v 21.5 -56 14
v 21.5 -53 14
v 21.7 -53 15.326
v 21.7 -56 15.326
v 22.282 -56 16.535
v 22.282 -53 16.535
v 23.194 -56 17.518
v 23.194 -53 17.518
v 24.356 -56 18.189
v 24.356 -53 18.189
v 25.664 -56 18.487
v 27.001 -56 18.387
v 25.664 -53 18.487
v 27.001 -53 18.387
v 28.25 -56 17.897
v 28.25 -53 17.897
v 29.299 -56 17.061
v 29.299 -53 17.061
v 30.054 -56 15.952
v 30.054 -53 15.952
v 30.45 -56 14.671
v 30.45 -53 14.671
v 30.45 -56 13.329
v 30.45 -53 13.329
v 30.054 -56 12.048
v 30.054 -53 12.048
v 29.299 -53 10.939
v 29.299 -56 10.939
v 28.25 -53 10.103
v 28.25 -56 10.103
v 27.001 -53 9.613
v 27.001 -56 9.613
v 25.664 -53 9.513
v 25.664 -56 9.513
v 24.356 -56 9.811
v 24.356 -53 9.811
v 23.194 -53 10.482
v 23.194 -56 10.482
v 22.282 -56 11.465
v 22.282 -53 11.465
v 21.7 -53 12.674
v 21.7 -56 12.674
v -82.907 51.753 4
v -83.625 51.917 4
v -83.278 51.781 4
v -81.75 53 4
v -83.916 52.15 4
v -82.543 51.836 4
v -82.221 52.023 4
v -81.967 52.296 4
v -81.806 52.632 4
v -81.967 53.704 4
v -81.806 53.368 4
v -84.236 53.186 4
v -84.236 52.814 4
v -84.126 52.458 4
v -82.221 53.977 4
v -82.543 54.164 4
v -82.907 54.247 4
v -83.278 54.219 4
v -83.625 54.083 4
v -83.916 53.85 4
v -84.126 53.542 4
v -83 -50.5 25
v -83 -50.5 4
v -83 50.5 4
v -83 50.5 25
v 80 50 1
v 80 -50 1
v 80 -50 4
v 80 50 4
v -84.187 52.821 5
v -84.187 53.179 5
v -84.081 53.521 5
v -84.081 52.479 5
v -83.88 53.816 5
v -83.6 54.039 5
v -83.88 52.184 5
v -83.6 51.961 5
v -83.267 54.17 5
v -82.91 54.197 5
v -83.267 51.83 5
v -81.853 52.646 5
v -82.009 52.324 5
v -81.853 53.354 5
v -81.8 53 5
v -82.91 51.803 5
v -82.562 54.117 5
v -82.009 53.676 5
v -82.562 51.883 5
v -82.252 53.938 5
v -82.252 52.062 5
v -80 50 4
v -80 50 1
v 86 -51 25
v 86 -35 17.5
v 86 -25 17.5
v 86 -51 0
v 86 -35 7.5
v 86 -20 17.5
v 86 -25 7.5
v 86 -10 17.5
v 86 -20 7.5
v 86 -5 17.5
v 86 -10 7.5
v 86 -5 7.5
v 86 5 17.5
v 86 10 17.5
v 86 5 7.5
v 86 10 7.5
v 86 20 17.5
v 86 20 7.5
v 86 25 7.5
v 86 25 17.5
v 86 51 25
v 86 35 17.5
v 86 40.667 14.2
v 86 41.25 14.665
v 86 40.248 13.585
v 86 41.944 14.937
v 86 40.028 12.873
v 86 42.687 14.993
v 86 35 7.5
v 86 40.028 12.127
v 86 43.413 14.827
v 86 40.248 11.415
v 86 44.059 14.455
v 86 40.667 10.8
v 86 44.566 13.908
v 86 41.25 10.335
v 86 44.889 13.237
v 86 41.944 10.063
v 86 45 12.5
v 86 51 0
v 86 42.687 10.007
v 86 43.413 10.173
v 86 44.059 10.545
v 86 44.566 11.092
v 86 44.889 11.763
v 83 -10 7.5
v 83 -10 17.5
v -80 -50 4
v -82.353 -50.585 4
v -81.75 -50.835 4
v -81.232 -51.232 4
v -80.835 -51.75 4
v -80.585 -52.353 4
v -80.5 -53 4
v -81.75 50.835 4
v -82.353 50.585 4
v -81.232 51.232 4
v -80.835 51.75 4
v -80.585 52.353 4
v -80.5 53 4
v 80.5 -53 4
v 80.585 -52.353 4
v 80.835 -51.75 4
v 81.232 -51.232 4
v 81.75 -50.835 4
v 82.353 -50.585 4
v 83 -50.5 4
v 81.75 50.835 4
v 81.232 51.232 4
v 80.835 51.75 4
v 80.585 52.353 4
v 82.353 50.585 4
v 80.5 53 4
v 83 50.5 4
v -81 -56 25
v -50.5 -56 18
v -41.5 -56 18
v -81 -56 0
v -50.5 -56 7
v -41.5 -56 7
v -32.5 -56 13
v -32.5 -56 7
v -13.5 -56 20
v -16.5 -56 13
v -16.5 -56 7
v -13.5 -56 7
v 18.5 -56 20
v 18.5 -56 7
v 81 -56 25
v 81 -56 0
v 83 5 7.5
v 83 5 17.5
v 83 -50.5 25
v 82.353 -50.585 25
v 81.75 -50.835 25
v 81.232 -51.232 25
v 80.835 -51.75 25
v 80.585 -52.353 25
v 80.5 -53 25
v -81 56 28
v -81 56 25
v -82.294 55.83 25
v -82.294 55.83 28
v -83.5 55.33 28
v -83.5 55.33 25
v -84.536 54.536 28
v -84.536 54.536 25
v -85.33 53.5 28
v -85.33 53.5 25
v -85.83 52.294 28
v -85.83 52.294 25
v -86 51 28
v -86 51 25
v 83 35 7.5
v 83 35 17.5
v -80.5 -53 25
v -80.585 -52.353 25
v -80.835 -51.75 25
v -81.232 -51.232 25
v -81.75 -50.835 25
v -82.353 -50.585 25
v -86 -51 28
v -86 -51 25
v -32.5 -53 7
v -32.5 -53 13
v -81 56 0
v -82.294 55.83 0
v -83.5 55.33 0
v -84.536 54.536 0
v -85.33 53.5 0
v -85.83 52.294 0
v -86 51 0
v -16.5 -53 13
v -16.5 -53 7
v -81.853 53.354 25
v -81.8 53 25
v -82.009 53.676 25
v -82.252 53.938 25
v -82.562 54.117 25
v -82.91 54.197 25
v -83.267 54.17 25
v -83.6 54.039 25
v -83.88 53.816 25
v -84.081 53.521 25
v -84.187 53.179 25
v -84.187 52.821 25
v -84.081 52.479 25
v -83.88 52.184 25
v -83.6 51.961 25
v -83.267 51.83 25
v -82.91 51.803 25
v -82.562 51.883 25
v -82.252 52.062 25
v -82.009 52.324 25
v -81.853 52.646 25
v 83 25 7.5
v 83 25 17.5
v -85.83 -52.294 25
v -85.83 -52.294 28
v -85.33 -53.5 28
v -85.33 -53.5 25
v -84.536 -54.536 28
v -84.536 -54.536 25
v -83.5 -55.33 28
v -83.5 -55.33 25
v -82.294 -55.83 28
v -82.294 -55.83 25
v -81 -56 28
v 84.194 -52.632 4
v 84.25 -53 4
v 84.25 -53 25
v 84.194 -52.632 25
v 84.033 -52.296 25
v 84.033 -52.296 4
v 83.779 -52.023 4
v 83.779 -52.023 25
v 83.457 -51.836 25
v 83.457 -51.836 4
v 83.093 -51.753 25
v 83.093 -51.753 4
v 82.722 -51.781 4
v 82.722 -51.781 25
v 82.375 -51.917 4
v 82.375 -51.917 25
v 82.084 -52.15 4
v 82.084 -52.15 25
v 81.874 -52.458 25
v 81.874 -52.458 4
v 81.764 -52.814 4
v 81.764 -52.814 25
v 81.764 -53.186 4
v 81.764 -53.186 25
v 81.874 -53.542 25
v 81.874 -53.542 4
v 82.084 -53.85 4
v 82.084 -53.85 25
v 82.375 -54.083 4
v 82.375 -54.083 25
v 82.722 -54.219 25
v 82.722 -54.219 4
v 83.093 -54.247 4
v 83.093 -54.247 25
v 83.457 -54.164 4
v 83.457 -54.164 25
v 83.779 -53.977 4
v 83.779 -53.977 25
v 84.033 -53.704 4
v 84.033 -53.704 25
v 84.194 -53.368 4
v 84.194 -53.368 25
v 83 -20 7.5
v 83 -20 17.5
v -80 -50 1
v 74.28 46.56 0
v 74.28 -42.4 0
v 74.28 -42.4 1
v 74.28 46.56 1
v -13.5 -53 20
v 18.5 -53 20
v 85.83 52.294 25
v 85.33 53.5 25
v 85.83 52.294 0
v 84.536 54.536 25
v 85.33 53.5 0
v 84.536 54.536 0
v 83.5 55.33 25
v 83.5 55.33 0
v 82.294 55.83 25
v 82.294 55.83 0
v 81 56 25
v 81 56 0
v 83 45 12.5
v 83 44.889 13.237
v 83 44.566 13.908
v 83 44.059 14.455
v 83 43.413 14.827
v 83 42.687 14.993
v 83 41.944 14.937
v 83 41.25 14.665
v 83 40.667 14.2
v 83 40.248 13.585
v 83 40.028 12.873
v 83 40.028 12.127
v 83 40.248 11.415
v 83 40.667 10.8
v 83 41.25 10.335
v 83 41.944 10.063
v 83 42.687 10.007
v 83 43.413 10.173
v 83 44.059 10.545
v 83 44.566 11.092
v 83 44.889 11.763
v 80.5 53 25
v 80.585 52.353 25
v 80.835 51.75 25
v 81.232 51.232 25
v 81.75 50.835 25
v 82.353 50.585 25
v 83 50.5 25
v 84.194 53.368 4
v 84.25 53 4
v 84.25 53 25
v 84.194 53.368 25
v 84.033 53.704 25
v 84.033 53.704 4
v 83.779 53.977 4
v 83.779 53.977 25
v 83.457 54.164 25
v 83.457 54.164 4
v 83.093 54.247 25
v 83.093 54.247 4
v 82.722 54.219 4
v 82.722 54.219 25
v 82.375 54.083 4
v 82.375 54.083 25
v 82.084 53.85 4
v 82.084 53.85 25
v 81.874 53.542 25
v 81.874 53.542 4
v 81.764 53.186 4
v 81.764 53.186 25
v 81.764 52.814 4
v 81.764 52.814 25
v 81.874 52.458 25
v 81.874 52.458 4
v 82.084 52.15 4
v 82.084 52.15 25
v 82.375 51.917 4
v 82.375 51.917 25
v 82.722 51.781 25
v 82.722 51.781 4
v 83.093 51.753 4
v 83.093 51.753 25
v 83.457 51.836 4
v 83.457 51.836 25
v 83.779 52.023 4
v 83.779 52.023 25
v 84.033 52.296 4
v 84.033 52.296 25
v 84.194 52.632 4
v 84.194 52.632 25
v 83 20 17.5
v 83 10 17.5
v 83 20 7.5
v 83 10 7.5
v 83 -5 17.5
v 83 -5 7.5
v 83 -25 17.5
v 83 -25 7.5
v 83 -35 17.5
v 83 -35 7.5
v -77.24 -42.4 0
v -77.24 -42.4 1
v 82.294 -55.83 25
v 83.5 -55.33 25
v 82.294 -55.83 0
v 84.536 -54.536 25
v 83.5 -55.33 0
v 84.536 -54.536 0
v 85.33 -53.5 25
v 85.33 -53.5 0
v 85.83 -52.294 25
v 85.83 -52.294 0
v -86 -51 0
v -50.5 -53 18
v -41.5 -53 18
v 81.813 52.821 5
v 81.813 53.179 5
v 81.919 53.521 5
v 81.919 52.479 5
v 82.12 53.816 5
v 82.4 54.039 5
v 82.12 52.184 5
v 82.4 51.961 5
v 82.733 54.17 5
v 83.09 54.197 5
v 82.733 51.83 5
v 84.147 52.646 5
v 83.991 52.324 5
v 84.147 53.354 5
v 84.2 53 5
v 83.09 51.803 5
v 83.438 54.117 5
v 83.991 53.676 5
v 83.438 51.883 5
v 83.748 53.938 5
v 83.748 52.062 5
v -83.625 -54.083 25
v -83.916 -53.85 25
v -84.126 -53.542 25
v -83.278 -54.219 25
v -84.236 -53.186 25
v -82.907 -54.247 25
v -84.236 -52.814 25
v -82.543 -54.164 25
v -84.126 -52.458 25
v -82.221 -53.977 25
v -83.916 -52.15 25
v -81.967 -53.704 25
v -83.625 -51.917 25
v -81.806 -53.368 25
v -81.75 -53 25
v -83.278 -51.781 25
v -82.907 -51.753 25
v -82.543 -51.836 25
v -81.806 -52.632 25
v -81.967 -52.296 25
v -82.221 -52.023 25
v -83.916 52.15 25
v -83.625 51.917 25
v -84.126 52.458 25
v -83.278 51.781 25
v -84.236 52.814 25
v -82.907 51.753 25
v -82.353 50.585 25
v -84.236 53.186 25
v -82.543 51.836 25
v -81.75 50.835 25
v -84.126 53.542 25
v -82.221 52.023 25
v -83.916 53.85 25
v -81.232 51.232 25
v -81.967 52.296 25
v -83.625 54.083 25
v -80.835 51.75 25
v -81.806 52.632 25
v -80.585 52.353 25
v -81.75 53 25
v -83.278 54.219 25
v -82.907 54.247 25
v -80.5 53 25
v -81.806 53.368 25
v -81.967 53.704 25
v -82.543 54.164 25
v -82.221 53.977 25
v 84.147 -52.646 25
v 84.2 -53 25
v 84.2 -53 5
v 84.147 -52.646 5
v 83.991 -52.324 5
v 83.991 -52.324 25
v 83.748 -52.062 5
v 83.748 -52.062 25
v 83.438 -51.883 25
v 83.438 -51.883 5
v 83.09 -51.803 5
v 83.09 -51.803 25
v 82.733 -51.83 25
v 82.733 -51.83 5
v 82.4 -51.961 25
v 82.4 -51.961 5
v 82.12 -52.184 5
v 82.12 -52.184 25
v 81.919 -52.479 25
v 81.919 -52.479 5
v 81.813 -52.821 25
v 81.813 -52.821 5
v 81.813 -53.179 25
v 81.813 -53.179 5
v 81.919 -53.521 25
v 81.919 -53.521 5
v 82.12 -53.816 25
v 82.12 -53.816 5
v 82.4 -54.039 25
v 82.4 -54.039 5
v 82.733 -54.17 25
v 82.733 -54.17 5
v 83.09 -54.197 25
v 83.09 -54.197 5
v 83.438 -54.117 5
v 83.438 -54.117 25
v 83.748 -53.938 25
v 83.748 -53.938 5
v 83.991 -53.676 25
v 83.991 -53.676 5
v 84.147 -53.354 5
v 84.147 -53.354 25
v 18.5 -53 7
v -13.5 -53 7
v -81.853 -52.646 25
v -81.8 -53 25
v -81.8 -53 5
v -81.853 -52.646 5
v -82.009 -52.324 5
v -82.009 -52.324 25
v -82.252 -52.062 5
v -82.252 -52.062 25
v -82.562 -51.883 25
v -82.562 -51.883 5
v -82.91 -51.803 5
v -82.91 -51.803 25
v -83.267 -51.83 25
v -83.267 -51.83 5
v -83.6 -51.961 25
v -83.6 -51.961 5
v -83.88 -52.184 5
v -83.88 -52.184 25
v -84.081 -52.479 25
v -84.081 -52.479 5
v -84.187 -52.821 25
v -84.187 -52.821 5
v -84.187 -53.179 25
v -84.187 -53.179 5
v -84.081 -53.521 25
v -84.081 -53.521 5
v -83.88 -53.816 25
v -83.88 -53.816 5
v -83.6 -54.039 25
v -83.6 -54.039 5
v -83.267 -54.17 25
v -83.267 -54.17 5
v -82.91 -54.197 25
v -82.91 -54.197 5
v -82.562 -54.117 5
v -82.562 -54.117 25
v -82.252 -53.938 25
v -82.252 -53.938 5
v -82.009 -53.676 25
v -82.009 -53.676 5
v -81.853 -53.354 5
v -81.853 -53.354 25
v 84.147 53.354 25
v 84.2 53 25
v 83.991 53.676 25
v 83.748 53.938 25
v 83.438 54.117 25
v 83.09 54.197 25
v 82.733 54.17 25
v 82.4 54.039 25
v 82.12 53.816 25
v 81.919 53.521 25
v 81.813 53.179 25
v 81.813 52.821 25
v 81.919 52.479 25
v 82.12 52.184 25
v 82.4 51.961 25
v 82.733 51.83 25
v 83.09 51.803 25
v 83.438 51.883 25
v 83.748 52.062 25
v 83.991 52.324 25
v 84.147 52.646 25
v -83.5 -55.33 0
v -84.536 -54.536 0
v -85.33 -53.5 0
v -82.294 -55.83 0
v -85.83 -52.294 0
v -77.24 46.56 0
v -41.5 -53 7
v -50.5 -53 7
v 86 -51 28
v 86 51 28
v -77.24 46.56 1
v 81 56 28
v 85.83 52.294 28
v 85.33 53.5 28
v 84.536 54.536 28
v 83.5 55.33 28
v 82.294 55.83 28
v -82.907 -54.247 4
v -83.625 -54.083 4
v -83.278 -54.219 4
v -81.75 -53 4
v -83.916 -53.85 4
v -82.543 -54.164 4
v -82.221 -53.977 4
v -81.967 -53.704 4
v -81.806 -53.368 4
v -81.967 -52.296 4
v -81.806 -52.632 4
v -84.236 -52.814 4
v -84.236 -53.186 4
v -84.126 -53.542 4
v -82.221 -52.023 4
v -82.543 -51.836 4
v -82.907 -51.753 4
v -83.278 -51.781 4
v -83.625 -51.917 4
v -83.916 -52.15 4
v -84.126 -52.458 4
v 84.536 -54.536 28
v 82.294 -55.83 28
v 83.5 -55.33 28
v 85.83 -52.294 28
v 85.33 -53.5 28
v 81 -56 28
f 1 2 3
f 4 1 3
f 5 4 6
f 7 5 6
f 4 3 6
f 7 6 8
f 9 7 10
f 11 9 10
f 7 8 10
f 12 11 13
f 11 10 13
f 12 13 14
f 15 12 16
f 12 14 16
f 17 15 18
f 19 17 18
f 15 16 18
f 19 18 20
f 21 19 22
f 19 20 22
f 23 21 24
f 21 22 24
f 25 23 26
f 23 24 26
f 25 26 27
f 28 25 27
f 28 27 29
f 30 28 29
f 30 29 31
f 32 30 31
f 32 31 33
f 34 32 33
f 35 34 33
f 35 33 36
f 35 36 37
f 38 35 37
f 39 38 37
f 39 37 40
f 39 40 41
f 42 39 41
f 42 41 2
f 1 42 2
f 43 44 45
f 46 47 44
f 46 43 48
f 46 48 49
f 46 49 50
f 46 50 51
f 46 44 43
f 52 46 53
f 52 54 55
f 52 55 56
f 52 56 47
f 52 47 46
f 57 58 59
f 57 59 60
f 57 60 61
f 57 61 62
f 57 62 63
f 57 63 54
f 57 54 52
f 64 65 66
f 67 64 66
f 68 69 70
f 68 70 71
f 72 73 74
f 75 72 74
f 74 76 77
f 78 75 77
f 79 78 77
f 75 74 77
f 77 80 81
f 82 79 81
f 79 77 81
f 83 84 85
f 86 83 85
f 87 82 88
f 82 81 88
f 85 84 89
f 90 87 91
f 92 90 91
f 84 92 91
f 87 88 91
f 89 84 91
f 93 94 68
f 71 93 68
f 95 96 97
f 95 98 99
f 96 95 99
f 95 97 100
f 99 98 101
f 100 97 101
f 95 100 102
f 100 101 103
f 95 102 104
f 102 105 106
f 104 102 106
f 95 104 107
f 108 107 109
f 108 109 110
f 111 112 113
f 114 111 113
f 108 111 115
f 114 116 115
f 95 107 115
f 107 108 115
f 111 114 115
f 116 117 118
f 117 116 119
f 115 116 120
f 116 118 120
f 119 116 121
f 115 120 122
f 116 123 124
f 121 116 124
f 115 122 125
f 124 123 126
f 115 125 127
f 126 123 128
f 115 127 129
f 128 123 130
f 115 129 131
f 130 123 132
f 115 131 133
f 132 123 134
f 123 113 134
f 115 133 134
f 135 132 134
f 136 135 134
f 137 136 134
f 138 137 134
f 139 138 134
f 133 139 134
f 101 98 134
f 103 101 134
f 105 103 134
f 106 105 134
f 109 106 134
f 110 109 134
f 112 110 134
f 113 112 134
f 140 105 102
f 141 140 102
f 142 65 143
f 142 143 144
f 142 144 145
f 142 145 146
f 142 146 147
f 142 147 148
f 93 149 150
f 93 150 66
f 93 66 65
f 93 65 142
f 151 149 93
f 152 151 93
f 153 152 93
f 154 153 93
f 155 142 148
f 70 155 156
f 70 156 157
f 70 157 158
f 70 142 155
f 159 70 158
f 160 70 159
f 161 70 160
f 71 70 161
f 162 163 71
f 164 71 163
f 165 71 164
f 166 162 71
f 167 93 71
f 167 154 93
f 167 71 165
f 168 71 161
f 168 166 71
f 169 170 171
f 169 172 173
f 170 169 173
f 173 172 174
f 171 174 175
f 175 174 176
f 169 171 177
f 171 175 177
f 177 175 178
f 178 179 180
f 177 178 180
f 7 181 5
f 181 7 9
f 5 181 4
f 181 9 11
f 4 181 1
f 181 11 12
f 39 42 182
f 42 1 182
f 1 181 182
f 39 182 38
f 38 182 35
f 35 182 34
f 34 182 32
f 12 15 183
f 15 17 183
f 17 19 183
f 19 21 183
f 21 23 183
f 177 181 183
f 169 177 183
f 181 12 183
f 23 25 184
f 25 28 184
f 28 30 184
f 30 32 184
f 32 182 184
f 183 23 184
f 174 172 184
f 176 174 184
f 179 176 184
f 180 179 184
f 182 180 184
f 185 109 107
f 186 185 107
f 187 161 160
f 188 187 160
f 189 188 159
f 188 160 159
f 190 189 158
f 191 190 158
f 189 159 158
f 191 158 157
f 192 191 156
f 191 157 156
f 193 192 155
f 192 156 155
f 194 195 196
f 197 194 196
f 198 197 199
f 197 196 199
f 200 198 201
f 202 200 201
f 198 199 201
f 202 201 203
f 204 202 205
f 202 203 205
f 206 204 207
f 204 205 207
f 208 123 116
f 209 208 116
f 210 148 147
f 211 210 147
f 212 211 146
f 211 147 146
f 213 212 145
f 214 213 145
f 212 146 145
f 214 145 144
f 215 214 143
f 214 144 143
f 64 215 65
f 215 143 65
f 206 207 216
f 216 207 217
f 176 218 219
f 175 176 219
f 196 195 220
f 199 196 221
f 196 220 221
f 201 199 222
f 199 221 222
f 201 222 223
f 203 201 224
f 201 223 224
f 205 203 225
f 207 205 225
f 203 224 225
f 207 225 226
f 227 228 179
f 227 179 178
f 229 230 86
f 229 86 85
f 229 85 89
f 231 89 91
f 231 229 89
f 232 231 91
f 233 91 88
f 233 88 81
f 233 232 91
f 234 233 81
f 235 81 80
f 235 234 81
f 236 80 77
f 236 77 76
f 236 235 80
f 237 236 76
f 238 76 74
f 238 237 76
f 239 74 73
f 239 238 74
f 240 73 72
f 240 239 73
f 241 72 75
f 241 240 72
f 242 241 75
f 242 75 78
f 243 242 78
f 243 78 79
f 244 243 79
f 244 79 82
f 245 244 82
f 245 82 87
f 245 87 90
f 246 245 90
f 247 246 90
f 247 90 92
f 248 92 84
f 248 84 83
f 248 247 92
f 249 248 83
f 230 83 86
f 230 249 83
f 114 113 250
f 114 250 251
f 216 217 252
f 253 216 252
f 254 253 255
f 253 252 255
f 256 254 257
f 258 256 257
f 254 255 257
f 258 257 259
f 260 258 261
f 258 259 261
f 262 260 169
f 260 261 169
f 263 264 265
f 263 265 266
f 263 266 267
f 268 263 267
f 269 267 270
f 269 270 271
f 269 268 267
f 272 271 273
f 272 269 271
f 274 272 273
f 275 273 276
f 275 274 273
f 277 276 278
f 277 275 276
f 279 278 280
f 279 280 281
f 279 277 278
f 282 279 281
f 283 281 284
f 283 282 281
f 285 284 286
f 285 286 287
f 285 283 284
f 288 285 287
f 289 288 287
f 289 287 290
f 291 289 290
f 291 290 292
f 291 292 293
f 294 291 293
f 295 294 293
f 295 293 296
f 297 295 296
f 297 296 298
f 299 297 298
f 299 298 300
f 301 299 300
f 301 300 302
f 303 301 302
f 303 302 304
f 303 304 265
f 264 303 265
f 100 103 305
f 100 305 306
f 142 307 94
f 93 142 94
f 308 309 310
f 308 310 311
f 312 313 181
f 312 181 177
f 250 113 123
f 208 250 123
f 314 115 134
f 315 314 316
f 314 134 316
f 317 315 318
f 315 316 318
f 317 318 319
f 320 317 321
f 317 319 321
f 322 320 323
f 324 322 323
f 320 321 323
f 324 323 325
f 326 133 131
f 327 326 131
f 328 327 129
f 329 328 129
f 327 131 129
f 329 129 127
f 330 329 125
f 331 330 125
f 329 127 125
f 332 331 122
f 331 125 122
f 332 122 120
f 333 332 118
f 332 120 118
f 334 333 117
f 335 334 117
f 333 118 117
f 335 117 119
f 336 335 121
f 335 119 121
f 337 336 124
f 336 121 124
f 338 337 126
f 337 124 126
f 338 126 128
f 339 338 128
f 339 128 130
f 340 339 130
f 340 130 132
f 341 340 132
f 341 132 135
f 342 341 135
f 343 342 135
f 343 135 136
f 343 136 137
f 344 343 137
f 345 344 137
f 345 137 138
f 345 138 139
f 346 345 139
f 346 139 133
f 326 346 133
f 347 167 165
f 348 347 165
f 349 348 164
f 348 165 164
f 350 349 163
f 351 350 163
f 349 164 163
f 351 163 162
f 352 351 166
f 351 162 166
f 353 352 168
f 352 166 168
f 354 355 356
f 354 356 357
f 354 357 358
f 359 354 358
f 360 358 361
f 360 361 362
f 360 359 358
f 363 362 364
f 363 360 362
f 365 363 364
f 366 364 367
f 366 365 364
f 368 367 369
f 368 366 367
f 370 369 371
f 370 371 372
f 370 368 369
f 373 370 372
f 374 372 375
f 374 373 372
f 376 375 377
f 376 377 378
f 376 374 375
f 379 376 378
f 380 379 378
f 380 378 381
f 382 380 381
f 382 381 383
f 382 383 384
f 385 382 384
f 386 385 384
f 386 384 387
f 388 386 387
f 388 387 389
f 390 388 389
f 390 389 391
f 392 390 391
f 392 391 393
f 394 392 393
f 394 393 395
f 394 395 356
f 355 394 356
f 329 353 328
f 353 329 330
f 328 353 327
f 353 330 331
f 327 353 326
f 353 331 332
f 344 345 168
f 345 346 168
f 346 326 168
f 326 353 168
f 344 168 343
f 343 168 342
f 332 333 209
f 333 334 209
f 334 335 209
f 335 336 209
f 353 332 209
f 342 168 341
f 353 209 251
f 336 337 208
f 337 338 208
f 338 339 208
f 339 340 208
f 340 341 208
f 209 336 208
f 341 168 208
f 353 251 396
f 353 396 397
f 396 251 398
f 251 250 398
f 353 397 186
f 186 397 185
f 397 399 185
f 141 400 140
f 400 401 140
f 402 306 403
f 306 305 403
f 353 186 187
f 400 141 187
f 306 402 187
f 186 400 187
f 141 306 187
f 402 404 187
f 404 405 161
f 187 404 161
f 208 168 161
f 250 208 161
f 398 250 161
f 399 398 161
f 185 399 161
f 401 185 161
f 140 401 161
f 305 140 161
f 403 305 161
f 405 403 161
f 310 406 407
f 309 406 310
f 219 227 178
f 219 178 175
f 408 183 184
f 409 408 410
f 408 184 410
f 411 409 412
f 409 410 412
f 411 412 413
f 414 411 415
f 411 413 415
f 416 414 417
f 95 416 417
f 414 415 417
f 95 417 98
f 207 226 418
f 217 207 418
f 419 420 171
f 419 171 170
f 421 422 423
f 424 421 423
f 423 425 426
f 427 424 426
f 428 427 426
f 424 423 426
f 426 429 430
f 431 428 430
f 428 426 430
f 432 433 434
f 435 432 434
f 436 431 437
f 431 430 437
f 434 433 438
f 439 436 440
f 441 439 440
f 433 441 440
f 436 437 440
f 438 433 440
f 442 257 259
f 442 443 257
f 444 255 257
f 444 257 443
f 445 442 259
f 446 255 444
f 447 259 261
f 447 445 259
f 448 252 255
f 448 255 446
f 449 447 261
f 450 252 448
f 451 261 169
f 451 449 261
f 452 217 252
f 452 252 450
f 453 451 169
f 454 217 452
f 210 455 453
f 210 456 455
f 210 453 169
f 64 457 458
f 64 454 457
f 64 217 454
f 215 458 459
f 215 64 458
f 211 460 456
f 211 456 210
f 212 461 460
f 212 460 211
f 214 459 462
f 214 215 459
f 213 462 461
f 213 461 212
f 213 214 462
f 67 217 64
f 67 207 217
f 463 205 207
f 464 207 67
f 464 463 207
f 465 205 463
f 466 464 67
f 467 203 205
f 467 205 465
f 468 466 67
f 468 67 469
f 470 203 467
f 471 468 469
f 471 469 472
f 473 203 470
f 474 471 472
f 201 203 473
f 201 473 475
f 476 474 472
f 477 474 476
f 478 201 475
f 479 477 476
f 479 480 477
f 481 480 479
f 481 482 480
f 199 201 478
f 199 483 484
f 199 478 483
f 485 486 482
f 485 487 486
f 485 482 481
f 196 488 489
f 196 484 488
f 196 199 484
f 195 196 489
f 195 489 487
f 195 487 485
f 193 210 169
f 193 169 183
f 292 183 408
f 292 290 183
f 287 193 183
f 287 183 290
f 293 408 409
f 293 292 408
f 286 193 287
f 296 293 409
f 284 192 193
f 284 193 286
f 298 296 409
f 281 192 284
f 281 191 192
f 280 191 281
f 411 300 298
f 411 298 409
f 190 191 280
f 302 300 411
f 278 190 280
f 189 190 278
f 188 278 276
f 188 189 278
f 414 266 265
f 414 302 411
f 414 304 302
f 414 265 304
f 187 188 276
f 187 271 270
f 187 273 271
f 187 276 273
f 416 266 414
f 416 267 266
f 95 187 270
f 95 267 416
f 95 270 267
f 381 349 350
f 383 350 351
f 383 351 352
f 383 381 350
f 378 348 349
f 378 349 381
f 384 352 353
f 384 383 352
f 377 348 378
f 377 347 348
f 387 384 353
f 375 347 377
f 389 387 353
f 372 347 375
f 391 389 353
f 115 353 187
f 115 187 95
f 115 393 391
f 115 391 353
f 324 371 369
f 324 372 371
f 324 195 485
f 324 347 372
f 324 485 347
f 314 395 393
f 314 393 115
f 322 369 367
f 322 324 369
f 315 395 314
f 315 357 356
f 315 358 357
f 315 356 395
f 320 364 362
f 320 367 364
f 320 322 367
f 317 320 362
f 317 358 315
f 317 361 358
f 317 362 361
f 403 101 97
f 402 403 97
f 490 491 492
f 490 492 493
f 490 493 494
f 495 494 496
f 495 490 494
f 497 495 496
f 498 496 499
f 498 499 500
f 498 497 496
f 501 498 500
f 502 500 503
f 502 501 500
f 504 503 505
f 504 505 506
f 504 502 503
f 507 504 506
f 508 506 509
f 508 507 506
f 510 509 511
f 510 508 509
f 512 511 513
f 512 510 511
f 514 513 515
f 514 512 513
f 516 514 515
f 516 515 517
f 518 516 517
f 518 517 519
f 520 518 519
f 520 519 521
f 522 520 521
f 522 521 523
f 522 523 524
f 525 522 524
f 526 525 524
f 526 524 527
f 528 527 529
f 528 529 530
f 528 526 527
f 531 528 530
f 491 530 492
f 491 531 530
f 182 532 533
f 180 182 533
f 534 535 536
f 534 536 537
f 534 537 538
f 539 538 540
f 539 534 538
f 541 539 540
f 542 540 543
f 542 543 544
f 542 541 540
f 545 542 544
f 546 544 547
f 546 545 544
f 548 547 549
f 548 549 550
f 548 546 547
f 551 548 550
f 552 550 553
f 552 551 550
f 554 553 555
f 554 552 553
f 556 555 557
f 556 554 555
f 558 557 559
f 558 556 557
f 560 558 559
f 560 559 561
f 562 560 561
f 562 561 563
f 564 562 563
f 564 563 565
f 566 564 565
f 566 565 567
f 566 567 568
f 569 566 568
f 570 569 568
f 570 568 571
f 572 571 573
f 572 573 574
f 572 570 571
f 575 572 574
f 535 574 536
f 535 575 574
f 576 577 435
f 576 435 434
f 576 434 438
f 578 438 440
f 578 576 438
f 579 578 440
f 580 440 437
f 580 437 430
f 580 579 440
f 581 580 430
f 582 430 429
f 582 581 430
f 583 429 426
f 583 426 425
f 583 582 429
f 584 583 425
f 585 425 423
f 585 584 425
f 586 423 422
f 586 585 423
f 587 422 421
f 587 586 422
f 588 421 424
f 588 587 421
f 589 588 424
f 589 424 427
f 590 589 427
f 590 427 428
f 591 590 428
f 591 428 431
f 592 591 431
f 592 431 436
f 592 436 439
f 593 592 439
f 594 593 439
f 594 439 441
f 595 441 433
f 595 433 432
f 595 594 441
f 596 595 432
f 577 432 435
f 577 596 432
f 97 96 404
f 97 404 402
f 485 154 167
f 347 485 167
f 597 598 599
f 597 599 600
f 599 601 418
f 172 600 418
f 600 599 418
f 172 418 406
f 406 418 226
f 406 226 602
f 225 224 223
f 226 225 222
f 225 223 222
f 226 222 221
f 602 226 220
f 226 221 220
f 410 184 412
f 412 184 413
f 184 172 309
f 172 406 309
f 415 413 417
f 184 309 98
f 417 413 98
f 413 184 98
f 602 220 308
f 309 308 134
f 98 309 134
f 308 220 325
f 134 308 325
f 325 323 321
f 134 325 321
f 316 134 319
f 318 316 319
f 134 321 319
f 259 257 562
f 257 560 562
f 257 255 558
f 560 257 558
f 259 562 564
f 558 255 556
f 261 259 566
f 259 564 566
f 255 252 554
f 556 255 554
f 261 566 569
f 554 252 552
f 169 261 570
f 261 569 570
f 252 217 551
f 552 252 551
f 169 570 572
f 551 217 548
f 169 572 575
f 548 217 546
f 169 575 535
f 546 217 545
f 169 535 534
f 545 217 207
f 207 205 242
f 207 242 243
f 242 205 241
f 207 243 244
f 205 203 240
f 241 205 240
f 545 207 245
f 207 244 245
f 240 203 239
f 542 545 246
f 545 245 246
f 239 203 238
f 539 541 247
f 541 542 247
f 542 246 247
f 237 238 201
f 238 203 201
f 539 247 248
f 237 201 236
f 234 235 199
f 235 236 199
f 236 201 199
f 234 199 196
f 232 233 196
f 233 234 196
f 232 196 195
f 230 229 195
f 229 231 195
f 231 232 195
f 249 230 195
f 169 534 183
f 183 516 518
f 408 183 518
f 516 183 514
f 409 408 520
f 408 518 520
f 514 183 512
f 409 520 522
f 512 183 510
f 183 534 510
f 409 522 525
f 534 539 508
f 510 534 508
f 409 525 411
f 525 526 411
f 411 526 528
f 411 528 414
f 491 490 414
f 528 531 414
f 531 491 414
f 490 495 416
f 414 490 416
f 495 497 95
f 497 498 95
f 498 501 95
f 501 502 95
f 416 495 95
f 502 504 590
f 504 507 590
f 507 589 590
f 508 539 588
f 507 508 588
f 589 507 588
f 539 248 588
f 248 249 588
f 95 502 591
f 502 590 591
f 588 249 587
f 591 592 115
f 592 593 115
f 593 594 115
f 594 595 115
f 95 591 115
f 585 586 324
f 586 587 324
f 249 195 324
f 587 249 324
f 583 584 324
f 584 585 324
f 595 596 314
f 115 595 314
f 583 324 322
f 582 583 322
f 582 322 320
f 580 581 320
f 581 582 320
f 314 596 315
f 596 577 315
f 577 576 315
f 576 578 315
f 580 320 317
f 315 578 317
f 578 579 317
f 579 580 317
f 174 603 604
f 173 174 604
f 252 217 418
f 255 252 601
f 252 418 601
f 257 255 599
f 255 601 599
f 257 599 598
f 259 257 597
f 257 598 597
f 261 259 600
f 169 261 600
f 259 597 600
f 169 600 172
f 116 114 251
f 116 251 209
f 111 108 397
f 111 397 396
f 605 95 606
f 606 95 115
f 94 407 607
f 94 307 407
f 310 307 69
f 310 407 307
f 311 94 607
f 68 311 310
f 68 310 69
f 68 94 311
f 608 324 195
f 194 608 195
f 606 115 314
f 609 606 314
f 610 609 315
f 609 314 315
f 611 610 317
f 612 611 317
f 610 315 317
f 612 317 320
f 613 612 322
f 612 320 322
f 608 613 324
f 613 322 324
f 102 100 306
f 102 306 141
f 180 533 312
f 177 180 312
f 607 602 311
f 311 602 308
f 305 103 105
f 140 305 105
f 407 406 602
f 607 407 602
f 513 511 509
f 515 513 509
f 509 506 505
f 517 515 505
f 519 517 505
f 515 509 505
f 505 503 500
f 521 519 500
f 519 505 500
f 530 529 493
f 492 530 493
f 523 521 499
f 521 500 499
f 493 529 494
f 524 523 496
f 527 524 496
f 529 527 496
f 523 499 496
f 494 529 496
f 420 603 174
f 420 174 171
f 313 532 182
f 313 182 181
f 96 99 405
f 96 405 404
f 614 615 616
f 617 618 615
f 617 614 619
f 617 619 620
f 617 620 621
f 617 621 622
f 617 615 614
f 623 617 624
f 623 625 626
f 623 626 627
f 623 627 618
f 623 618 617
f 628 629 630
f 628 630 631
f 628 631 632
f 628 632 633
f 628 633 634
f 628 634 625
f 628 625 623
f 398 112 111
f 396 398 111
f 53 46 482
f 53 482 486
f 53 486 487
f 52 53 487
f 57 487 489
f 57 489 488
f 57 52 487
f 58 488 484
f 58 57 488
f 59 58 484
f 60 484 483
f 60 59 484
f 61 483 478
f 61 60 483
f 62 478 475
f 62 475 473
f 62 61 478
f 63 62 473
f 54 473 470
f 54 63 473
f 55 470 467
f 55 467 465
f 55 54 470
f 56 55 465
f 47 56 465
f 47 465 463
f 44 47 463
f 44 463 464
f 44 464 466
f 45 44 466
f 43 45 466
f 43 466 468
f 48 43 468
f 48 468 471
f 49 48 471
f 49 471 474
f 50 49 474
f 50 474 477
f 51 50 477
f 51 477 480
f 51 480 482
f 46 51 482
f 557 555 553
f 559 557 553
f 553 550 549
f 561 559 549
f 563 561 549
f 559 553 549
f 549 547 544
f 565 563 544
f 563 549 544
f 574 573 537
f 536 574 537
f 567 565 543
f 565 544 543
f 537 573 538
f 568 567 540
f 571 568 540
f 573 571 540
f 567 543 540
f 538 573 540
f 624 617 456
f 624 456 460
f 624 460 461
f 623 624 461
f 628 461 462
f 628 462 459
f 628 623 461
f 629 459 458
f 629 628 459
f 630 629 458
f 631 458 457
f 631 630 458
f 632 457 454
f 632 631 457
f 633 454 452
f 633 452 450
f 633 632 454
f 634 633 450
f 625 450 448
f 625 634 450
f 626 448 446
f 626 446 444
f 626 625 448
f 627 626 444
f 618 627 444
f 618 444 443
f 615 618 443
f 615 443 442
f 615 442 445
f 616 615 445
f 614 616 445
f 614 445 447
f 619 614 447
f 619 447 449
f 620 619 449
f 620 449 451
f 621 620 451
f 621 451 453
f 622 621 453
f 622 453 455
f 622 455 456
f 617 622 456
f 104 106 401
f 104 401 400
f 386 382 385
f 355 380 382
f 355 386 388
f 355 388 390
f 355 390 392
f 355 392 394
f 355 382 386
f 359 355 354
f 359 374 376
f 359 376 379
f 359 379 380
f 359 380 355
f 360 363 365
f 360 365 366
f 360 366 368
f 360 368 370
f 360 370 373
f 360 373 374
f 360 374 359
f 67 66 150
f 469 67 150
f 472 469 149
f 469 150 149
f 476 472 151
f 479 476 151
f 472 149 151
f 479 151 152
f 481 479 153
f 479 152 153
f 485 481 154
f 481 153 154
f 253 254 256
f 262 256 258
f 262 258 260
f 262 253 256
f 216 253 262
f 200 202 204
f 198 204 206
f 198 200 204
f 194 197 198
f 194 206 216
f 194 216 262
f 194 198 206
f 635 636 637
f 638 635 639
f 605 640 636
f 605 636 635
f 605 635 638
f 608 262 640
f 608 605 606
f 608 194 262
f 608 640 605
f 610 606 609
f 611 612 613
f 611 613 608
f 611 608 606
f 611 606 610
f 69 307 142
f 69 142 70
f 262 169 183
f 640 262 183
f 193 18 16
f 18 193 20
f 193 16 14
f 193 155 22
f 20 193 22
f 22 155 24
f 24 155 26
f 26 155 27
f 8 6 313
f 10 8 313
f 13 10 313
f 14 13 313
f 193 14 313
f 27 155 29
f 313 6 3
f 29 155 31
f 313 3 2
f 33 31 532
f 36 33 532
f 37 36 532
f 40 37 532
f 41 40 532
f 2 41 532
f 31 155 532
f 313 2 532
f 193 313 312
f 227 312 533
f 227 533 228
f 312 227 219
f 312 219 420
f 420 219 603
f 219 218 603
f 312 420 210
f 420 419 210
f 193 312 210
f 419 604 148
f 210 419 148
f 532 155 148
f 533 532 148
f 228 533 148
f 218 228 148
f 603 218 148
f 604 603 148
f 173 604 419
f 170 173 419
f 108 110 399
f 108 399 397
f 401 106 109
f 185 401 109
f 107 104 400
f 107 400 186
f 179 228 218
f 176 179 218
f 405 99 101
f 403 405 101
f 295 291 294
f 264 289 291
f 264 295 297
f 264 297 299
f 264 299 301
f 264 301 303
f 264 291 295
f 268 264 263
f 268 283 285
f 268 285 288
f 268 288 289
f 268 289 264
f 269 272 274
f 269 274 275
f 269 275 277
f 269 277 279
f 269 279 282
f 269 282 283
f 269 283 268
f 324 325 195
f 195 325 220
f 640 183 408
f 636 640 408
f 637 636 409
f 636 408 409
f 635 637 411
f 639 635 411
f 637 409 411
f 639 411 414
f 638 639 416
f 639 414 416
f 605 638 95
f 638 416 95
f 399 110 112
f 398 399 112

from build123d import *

# Parameters (mm, degrees)
F0_W      = 160
F0_H      = 100
F0_W_2    = 151.52
F0_H_2    = 88.96
F1_DEPTH  = 1
F2_DEPTH  = 4
F0_R      = 1.25
F3_DEPTH  = 25
F4_DEPTH  = 4
F5_DEPTH  = 4
F6_DEPTH  = 4
F7_DEPTH  = 4
F8_W      = 9
F8_H      = 11
F8_W_2    = 16
F8_H_2    = 6
F8_W_3    = 32
F8_H_3    = 13
F8_R      = 4.5
F9_DEPTH  = 25
F11_R     = 1.2
F12_DEPTH = 3
F13_DEPTH = 20
F14_W     = 10
F14_H     = 10
F14_R     = 2.5
F15_DEPTH = 25


with BuildPart() as f1:
    # F0 (on Top) → F1 (new body)
    with BuildSketch(Plane.XY):
        Rectangle(F0_W, F0_H)
        with Locations((-1.48, 2.08)):
            Rectangle(F0_W_2, F0_H_2, mode=Mode.SUBTRACT)
    extrude(amount=F1_DEPTH)

    # F0 (on Top) → F2 (join)
    with BuildSketch(Plane.XY):
        with BuildLine():
            Line((80.5, 53), (-80.5, 53))
            ThreePointArc((-80.5, 53), (-81.232233, 51.232233), (-83, 50.5))
            Line((-83, 50.5), (-83, -50.5))
            ThreePointArc((-83, -50.5), (-81.232233, -51.232233), (-80.5, -53))
            Line((-80.5, -53), (80.5, -53))
            ThreePointArc((80.5, -53), (81.232233, -51.232233), (83, -50.5))
            Line((83, -50.5), (83, 50.5))
            ThreePointArc((83, 50.5), (81.232233, 51.232233), (80.5, 53))
        make_face()
        Rectangle(F0_W, F0_H, mode=Mode.SUBTRACT)
    extrude(amount=F2_DEPTH)

    # F0 (on Top) → F3 (join)
    with BuildSketch(Plane.XY):
        with BuildLine():
            Line((81, 56), (-81, 56))
            ThreePointArc((-81, 56), (-84.535534, 54.535534), (-86, 51))
            Line((-86, 51), (-86, -51))
            ThreePointArc((-86, -51), (-84.535534, -54.535534), (-81, -56))
            Line((-81, -56), (81, -56))
            ThreePointArc((81, -56), (84.535534, -54.535534), (86, -51))
            Line((86, -51), (86, 51))
            ThreePointArc((86, 51), (84.535534, 54.535534), (81, 56))
        make_face()
        with Locations((-83, -53)):
            Circle(F0_R, mode=Mode.SUBTRACT)
        with Locations((83, -53)):
            Circle(F0_R, mode=Mode.SUBTRACT)
        with Locations((-83, 53)):
            Circle(F0_R, mode=Mode.SUBTRACT)
        with BuildLine():
            ThreePointArc((-83, 50.5), (-81.232233, 51.232233), (-80.5, 53))
            Line((-80.5, 53), (80.5, 53))
            ThreePointArc((80.5, 53), (81.232233, 51.232233), (83, 50.5))
            Line((83, 50.5), (83, -50.5))
            ThreePointArc((83, -50.5), (81.232233, -51.232233), (80.5, -53))
            Line((80.5, -53), (-80.5, -53))
            ThreePointArc((-80.5, -53), (-81.232233, -51.232233), (-83, -50.5))
            Line((-83, -50.5), (-83, 50.5))
        make_face(mode=Mode.SUBTRACT)
        with Locations((83, 53)):
            Circle(F0_R, mode=Mode.SUBTRACT)
    extrude(amount=F3_DEPTH)

    # F0 (on Top) → F4 (join)
    with BuildSketch(Plane.XY):
        with Locations((-83, 53)):
            Circle(F0_R)
    extrude(amount=F4_DEPTH)

    # F0 (on Top) → F5 (join)
    with BuildSketch(Plane.XY):
        with Locations((-83, -53)):
            Circle(F0_R)
    extrude(amount=F5_DEPTH)

    # F0 (on Top) → F6 (join)
    with BuildSketch(Plane.XY):
        with Locations((83, -53)):
            Circle(F0_R)
    extrude(amount=F6_DEPTH)

    # F0 (on Top) → F7 (join)
    with BuildSketch(Plane.XY):
        with Locations((83, 53)):
            Circle(F0_R)
    extrude(amount=F7_DEPTH)

    # F8 (on face) → F9 (cut)
    with BuildSketch(Plane(origin=(0, -53, 0), x_dir=(-1, 0, 0), z_dir=(0, 1, 0))):
        with Locations((46, 12.5)):
            Rectangle(F8_W, F8_H)
        with Locations((24.5, 10)):
            Rectangle(F8_W_2, F8_H_2)
        with Locations((-2.5, 13.5)):
            Rectangle(F8_W_3, F8_H_3)
        with Locations((-26, 14)):
            Circle(F8_R)
    extrude(amount=-F9_DEPTH, mode=Mode.SUBTRACT)

    # F14 (on face) → F15 (cut)
    with BuildSketch(Plane.YZ.offset(86)):
        with Locations((-30, 12.5)):
            Rectangle(F14_W, F14_H)
        with Locations((-15, 12.5)):
            Rectangle(F14_W, F14_H)
        with Locations((0, 12.5)):
            Rectangle(F14_W, F14_H)
        with Locations((15, 12.5)):
            Rectangle(F14_W, F14_H)
        with Locations((30, 12.5)):
            Rectangle(F14_W, F14_H)
        with Locations((42.5, 12.5)):
            Circle(F14_R)
    extrude(amount=-F15_DEPTH, mode=Mode.SUBTRACT)


with BuildPart() as f12:
    # F11 (on offset) → F12 (new body)
    with BuildSketch(Plane.XY.offset(25)):
        with BuildLine():
            ThreePointArc((86, 51), (84.535534, 54.535534), (81, 56))
            Line((81, 56), (-81, 56))
            ThreePointArc((-81, 56), (-84.535534, 54.535534), (-86, 51))
            Line((-86, 51), (-86, -51))
            ThreePointArc((-86, -51), (-84.535534, -54.535534), (-81, -56))
            Line((-81, -56), (81, -56))
            ThreePointArc((81, -56), (84.535534, -54.535534), (86, -51))
            Line((86, -51), (86, 51))
        make_face()
        with Locations((-83, -53)):
            Circle(F11_R, mode=Mode.SUBTRACT)
        with Locations((83, -53)):
            Circle(F11_R, mode=Mode.SUBTRACT)
        with Locations((-83, 53)):
            Circle(F11_R, mode=Mode.SUBTRACT)
        with Locations((83, 53)):
            Circle(F11_R, mode=Mode.SUBTRACT)
        with Locations((-83, -53)):
            Circle(F11_R)
        with Locations((83, -53)):
            Circle(F11_R)
        with Locations((83, 53)):
            Circle(F11_R)
        with Locations((-83, 53)):
            Circle(F11_R)
    extrude(amount=F12_DEPTH)

    # F11 (on offset) → F13 (join)
    with BuildSketch(Plane.XY.offset(25)):
        with Locations((-83, 53)):
            Circle(F11_R)
        with Locations((83, 53)):
            Circle(F11_R)
        with Locations((83, -53)):
            Circle(F11_R)
        with Locations((-83, -53)):
            Circle(F11_R)
    extrude(amount=-F13_DEPTH)


solid = Compound([f1.part, f12.part])
